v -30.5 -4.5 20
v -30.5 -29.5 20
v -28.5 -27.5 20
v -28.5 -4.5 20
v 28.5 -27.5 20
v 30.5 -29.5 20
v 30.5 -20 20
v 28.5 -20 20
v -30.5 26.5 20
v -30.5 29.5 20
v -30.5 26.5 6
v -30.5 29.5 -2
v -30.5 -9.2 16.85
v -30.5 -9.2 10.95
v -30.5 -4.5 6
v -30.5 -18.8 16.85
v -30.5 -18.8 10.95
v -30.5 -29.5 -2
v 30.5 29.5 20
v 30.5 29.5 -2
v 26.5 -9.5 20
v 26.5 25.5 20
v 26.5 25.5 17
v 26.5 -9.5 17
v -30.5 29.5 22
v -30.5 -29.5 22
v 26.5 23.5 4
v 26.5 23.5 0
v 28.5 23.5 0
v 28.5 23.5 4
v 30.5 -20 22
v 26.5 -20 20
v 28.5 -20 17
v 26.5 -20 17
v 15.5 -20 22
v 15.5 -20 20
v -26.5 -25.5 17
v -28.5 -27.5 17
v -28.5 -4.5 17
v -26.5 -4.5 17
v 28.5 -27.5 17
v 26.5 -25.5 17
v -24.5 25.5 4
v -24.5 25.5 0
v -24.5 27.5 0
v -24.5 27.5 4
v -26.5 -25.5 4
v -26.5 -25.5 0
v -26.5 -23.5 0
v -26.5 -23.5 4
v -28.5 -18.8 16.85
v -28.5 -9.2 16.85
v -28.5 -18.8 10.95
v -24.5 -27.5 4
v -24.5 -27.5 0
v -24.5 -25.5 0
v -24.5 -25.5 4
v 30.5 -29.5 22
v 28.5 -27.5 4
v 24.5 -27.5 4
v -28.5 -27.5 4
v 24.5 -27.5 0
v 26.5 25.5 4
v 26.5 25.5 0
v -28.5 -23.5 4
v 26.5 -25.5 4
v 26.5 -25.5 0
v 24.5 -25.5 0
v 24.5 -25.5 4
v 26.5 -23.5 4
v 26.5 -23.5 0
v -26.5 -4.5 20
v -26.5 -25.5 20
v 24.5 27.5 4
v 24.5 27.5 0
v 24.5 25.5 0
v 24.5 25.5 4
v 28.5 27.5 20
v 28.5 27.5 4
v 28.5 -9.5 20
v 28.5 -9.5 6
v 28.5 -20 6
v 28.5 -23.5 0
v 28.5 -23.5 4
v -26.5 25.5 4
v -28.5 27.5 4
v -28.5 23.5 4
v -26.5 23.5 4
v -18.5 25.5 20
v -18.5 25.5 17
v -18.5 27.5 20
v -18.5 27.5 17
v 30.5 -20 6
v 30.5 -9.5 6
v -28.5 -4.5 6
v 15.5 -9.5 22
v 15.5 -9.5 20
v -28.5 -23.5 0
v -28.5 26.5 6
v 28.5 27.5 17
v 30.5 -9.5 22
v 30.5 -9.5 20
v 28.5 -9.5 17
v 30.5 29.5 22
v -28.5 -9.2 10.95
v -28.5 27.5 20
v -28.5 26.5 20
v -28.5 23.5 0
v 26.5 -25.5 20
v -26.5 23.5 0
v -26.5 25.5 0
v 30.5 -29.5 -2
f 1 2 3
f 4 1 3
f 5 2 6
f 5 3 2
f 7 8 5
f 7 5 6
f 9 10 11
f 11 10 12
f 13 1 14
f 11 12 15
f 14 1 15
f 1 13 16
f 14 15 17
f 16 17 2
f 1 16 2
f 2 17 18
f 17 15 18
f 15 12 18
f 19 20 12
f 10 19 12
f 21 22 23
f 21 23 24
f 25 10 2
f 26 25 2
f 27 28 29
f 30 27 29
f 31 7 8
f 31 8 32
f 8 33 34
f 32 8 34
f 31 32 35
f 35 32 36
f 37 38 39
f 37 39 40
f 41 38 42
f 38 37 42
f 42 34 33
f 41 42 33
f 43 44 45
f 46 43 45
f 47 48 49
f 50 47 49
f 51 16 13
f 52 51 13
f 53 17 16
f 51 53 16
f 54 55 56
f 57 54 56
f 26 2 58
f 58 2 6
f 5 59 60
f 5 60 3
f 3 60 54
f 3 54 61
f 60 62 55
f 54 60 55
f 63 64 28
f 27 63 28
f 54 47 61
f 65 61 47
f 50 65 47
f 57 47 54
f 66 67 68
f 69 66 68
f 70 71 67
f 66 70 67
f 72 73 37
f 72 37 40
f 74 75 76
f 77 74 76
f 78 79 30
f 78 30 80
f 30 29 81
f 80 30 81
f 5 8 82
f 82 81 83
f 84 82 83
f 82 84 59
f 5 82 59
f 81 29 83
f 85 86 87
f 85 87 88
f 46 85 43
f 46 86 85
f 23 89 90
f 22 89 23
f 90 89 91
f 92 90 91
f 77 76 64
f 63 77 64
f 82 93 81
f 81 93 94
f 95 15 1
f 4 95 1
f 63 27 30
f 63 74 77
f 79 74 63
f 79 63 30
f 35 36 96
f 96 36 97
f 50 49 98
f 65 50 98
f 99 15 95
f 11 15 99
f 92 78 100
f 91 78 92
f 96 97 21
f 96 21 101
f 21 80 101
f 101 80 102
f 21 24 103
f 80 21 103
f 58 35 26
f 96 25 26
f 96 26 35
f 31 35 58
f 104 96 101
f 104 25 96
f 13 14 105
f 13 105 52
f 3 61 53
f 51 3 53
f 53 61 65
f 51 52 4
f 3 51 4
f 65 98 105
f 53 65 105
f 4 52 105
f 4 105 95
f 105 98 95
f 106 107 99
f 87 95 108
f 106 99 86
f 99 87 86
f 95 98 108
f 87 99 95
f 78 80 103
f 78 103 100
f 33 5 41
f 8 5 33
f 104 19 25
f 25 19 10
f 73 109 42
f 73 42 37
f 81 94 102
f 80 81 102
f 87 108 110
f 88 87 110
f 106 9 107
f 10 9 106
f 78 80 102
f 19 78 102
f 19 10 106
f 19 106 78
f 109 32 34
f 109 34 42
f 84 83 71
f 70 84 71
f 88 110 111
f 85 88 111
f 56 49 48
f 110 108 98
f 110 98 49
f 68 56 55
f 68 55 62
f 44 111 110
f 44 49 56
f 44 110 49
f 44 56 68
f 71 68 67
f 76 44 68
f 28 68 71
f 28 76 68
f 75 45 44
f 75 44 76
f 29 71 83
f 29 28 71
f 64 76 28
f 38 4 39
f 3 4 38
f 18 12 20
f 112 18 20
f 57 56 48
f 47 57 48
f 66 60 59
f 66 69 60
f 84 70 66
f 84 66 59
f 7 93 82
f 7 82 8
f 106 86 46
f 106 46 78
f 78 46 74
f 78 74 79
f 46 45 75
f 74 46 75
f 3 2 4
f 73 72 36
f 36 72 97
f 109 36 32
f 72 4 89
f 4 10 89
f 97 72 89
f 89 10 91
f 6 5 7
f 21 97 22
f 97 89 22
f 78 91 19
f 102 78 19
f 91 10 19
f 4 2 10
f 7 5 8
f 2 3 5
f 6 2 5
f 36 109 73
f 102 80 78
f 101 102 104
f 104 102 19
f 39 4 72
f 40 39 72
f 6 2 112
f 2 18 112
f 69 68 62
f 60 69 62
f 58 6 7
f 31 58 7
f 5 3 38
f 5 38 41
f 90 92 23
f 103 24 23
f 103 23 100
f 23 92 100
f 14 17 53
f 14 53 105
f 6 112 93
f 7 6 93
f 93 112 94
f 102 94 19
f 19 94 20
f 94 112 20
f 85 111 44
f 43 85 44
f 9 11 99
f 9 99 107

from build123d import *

# Parameters (mm, degrees)
F1_DEPTH  = 2
F2_DEPTH  = 20
F4_W      = 31
F4_H      = 14
F5_DEPTH  = 2
F7_W      = 10.5
F7_H      = 14
F8_DEPTH  = 2
F4_W_2    = 9.6
F4_H_2    = 5.9
F9_DEPTH  = 25
F11_W     = 8
F11_H     = 30
F12_DEPTH = 2
F13_DEPTH = 3
F14_DEPTH = 3
F15_DEPTH = 4


with BuildPart() as f1:
    # F0 (on Top) → F1 (new body)
    with BuildSketch(Plane.XY):
        Polygon((-30.5, 29.5), (-30.5, -4.5), (-30.5, -29.5), (30.5, -29.5), (30.5, 29.5), align=None)
        Polygon((28.5, -23.5), (28.5, -27.5), (24.5, -27.5), (-24.5, -27.5), (-28.5, -27.5), (-28.5, -23.5), (-28.5, -4.5), (-28.5, 23.5), (-28.5, 27.5), (-24.5, 27.5), (24.5, 27.5), (28.5, 27.5), (28.5, 23.5), align=None, mode=Mode.SUBTRACT)
        Polygon((24.5, -27.5), (28.5, -27.5), (28.5, -23.5), (26.5, -23.5), (26.5, -25.5), (24.5, -25.5), align=None)
        Polygon((-24.5, -27.5), (24.5, -27.5), (24.5, -25.5), (26.5, -25.5), (26.5, -23.5), (28.5, -23.5), (28.5, 23.5), (26.5, 23.5), (26.5, 25.5), (24.5, 25.5), (24.5, 27.5), (-24.5, 27.5), (-24.5, 25.5), (-26.5, 25.5), (-26.5, 23.5), (-28.5, 23.5), (-28.5, -4.5), (-28.5, -23.5), (-26.5, -23.5), (-26.5, -25.5), (-24.5, -25.5), align=None)
        Polygon((-28.5, -27.5), (-24.5, -27.5), (-24.5, -25.5), (-26.5, -25.5), (-26.5, -23.5), (-28.5, -23.5), align=None)
        Polygon((26.5, 23.5), (28.5, 23.5), (28.5, 27.5), (24.5, 27.5), (24.5, 25.5), (26.5, 25.5), align=None)
        Polygon((-24.5, 25.5), (-24.5, 27.5), (-28.5, 27.5), (-28.5, 23.5), (-26.5, 23.5), (-26.5, 25.5), align=None)
    extrude(amount=-F1_DEPTH)

    # F0 (on Top) → F2 (join)
    with BuildSketch(Plane.XY):
        Polygon((-30.5, 29.5), (-30.5, -4.5), (-30.5, -29.5), (30.5, -29.5), (30.5, 29.5), align=None)
        Polygon((28.5, -23.5), (28.5, -27.5), (24.5, -27.5), (-24.5, -27.5), (-28.5, -27.5), (-28.5, -23.5), (-28.5, -4.5), (-28.5, 23.5), (-28.5, 27.5), (-24.5, 27.5), (24.5, 27.5), (28.5, 27.5), (28.5, 23.5), align=None, mode=Mode.SUBTRACT)
    extrude(amount=F2_DEPTH)

    # F4 (on offset) → F5 (cut, through all)
    with BuildSketch(Plane.YZ.offset(-30.5)):
        with Locations((11, 13)):
            Rectangle(F4_W, F4_H)
    extrude(amount=F5_DEPTH, mode=Mode.SUBTRACT)

    # F7 (on offset) → F8 (cut, through all)
    with BuildSketch(Plane.YZ.offset(30.5)):
        with Locations((-14.75, 13)):
            Rectangle(F7_W, F7_H)
    extrude(amount=-F8_DEPTH, mode=Mode.SUBTRACT)

    # F4 (on offset) → F9 (cut)
    with BuildSketch(Plane.YZ.offset(-30.5)):
        with Locations((-14, 13.9)):
            Rectangle(F4_W_2, F4_H_2)
    extrude(amount=F9_DEPTH, mode=Mode.SUBTRACT)

    # F0 (on Top) → F15 (join)
    with BuildSketch(Plane.XY):
        Polygon((26.5, 23.5), (28.5, 23.5), (28.5, 27.5), (24.5, 27.5), (24.5, 25.5), (26.5, 25.5), align=None)
        Polygon((-24.5, 25.5), (-24.5, 27.5), (-28.5, 27.5), (-28.5, 23.5), (-26.5, 23.5), (-26.5, 25.5), align=None)
        Polygon((-28.5, -27.5), (-24.5, -27.5), (-24.5, -25.5), (-26.5, -25.5), (-26.5, -23.5), (-28.5, -23.5), align=None)
        Polygon((24.5, -27.5), (28.5, -27.5), (28.5, -23.5), (26.5, -23.5), (26.5, -25.5), (24.5, -25.5), align=None)
    extrude(amount=F15_DEPTH)


with BuildPart() as f12:
    # F11 (on offset) → F12 (new body)
    with BuildSketch(Plane.XY.offset(20)):
        Polygon((28.5, -20), (28.5, -27.5), (-28.5, -27.5), (-28.5, -4.5), (-28.5, 27.5), (-18.5, 27.5), (28.5, 27.5), (28.5, -9.5), (30.5, -9.5), (30.5, 29.5), (-30.5, 29.5), (-30.5, -29.5), (30.5, -29.5), (30.5, -20), align=None)
        Polygon((26.5, -25.5), (26.5, -20), (15.5, -20), (15.5, -9.5), (26.5, -9.5), (26.5, 25.5), (-18.5, 25.5), (-18.5, -4.5), (-26.5, -4.5), (-26.5, -25.5), align=None)
        Polygon((-28.5, -27.5), (28.5, -27.5), (28.5, -20), (26.5, -20), (26.5, -25.5), (-26.5, -25.5), (-26.5, -4.5), (-28.5, -4.5), align=None)
        with Locations((-22.5, 10.5)):
            Rectangle(F11_W, F11_H)
        Polygon((-28.5, 27.5), (-28.5, -4.5), (-26.5, -4.5), (-26.5, 25.5), (-18.5, 25.5), (-18.5, 27.5), align=None)
        Polygon((26.5, -9.5), (28.5, -9.5), (28.5, 27.5), (-18.5, 27.5), (-18.5, 25.5), (26.5, 25.5), align=None)
    extrude(amount=F12_DEPTH)

    # F11 (on offset) → F13 (join)
    with BuildSketch(Plane.XY.offset(20)):
        Polygon((-28.5, -27.5), (28.5, -27.5), (28.5, -20), (26.5, -20), (26.5, -25.5), (-26.5, -25.5), (-26.5, -4.5), (-28.5, -4.5), align=None)
        Polygon((-28.5, 27.5), (-28.5, -4.5), (-26.5, -4.5), (-26.5, 25.5), (-18.5, 25.5), (-18.5, 27.5), align=None)
        Polygon((26.5, -9.5), (28.5, -9.5), (28.5, 27.5), (-18.5, 27.5), (-18.5, 25.5), (26.5, 25.5), align=None)
    extrude(amount=-F13_DEPTH)

    # F11 (on offset) → F14 (cut)
    with BuildSketch(Plane.XY.offset(20)):
        with Locations((-22.5, 10.5)):
            Rectangle(F11_W, F11_H)
        Polygon((-28.5, 27.5), (-28.5, -4.5), (-26.5, -4.5), (-26.5, 25.5), (-18.5, 25.5), (-18.5, 27.5), align=None)
    extrude(amount=-F14_DEPTH, mode=Mode.SUBTRACT)


solid = Compound([f1.part, f12.part])
